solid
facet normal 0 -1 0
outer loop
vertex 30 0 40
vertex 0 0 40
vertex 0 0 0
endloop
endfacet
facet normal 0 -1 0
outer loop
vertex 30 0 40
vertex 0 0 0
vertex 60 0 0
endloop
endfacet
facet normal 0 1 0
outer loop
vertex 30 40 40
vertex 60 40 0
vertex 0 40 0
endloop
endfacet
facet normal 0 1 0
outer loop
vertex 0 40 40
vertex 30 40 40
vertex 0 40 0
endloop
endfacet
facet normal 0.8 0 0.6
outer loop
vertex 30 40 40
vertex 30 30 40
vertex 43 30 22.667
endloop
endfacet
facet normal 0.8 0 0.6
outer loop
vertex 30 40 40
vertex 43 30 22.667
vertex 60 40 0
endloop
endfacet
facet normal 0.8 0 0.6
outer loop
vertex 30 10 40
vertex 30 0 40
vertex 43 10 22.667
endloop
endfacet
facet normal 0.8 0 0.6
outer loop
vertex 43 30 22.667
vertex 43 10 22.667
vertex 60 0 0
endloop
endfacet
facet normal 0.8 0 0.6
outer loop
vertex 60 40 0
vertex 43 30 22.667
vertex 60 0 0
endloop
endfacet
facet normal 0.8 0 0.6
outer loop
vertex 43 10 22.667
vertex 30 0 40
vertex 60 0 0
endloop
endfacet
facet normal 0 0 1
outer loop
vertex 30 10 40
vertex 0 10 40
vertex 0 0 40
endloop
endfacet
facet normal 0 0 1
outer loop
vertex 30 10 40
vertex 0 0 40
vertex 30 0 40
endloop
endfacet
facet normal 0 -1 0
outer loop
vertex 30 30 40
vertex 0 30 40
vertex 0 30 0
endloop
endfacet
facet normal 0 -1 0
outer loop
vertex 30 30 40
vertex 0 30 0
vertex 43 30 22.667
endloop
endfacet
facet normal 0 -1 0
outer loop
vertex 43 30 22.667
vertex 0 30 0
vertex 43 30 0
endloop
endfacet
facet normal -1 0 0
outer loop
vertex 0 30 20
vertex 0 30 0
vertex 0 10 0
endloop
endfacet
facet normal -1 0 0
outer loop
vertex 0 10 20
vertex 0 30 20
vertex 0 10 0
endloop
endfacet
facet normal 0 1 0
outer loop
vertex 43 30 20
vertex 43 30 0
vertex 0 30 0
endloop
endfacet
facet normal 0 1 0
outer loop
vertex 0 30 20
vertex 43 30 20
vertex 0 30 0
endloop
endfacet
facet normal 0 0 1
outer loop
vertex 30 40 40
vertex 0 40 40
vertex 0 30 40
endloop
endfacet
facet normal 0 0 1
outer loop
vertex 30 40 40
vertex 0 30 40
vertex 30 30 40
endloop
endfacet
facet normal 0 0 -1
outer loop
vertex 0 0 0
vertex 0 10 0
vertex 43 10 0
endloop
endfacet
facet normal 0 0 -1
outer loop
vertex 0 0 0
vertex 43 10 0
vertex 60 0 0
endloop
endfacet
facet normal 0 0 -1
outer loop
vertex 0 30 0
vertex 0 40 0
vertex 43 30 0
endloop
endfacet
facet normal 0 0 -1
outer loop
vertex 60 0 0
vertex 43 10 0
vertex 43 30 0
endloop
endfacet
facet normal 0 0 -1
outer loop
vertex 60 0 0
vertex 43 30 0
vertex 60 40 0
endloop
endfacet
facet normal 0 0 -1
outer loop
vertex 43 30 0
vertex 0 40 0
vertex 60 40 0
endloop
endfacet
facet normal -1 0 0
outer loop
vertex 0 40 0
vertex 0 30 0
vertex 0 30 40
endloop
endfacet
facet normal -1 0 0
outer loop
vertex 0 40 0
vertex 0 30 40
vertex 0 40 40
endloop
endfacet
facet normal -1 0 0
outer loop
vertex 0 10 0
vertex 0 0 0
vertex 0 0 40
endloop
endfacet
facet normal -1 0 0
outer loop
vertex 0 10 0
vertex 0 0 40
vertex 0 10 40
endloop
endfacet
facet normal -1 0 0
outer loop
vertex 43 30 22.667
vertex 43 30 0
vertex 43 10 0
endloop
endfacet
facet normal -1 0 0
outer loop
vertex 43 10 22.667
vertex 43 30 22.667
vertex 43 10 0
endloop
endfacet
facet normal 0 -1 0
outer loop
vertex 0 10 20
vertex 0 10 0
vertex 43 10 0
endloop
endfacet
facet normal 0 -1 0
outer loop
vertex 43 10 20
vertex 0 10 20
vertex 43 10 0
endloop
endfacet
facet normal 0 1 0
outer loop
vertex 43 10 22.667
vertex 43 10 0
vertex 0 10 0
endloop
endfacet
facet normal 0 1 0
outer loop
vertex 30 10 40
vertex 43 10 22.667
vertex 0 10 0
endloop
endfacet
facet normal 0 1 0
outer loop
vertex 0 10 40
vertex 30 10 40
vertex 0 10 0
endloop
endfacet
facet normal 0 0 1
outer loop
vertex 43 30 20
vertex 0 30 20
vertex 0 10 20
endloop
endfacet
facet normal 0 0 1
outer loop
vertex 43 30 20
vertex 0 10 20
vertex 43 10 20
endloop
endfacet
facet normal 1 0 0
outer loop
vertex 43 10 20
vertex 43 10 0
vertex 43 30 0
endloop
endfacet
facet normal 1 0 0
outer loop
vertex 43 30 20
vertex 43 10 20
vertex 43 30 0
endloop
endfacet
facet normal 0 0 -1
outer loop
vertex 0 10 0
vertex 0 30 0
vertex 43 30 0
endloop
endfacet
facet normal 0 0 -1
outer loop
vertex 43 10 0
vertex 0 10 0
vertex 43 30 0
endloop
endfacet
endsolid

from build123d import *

# Parameters (mm, degrees)
F0_W     = 30
F0_H     = 10
F1_DEPTH = 40
F2_DEPTH = 20
F4_DEPTH = 40


with BuildPart() as f1:
    # F0 (on Top) → F1 (new body)
    with BuildSketch(Plane.XY):
        with Locations((15, 5)):
            Rectangle(F0_W, F0_H)
        with Locations((15, 35)):
            Rectangle(F0_W, F0_H)
        Polygon((30, 10), (30, 0), (60, 0), (60, 40), (30, 40), (30, 30), (43, 30), (43, 10), align=None)
    extrude(amount=F1_DEPTH)

    # F3 (on face) → F4 (cut)
    with BuildSketch(Plane.XZ):
        Polygon((60, 40), (30, 40), (60, 0), align=None)
    extrude(amount=-F4_DEPTH, mode=Mode.SUBTRACT)


with BuildPart() as f2:
    # F0 (on Top) → F2 (new body)
    with BuildSketch(Plane.XY):
        Polygon((0, 30), (0, 10), (30, 10), (43, 10), (43, 30), (30, 30), align=None)
    extrude(amount=F2_DEPTH)


solid = Compound([f1.part, f2.part])
